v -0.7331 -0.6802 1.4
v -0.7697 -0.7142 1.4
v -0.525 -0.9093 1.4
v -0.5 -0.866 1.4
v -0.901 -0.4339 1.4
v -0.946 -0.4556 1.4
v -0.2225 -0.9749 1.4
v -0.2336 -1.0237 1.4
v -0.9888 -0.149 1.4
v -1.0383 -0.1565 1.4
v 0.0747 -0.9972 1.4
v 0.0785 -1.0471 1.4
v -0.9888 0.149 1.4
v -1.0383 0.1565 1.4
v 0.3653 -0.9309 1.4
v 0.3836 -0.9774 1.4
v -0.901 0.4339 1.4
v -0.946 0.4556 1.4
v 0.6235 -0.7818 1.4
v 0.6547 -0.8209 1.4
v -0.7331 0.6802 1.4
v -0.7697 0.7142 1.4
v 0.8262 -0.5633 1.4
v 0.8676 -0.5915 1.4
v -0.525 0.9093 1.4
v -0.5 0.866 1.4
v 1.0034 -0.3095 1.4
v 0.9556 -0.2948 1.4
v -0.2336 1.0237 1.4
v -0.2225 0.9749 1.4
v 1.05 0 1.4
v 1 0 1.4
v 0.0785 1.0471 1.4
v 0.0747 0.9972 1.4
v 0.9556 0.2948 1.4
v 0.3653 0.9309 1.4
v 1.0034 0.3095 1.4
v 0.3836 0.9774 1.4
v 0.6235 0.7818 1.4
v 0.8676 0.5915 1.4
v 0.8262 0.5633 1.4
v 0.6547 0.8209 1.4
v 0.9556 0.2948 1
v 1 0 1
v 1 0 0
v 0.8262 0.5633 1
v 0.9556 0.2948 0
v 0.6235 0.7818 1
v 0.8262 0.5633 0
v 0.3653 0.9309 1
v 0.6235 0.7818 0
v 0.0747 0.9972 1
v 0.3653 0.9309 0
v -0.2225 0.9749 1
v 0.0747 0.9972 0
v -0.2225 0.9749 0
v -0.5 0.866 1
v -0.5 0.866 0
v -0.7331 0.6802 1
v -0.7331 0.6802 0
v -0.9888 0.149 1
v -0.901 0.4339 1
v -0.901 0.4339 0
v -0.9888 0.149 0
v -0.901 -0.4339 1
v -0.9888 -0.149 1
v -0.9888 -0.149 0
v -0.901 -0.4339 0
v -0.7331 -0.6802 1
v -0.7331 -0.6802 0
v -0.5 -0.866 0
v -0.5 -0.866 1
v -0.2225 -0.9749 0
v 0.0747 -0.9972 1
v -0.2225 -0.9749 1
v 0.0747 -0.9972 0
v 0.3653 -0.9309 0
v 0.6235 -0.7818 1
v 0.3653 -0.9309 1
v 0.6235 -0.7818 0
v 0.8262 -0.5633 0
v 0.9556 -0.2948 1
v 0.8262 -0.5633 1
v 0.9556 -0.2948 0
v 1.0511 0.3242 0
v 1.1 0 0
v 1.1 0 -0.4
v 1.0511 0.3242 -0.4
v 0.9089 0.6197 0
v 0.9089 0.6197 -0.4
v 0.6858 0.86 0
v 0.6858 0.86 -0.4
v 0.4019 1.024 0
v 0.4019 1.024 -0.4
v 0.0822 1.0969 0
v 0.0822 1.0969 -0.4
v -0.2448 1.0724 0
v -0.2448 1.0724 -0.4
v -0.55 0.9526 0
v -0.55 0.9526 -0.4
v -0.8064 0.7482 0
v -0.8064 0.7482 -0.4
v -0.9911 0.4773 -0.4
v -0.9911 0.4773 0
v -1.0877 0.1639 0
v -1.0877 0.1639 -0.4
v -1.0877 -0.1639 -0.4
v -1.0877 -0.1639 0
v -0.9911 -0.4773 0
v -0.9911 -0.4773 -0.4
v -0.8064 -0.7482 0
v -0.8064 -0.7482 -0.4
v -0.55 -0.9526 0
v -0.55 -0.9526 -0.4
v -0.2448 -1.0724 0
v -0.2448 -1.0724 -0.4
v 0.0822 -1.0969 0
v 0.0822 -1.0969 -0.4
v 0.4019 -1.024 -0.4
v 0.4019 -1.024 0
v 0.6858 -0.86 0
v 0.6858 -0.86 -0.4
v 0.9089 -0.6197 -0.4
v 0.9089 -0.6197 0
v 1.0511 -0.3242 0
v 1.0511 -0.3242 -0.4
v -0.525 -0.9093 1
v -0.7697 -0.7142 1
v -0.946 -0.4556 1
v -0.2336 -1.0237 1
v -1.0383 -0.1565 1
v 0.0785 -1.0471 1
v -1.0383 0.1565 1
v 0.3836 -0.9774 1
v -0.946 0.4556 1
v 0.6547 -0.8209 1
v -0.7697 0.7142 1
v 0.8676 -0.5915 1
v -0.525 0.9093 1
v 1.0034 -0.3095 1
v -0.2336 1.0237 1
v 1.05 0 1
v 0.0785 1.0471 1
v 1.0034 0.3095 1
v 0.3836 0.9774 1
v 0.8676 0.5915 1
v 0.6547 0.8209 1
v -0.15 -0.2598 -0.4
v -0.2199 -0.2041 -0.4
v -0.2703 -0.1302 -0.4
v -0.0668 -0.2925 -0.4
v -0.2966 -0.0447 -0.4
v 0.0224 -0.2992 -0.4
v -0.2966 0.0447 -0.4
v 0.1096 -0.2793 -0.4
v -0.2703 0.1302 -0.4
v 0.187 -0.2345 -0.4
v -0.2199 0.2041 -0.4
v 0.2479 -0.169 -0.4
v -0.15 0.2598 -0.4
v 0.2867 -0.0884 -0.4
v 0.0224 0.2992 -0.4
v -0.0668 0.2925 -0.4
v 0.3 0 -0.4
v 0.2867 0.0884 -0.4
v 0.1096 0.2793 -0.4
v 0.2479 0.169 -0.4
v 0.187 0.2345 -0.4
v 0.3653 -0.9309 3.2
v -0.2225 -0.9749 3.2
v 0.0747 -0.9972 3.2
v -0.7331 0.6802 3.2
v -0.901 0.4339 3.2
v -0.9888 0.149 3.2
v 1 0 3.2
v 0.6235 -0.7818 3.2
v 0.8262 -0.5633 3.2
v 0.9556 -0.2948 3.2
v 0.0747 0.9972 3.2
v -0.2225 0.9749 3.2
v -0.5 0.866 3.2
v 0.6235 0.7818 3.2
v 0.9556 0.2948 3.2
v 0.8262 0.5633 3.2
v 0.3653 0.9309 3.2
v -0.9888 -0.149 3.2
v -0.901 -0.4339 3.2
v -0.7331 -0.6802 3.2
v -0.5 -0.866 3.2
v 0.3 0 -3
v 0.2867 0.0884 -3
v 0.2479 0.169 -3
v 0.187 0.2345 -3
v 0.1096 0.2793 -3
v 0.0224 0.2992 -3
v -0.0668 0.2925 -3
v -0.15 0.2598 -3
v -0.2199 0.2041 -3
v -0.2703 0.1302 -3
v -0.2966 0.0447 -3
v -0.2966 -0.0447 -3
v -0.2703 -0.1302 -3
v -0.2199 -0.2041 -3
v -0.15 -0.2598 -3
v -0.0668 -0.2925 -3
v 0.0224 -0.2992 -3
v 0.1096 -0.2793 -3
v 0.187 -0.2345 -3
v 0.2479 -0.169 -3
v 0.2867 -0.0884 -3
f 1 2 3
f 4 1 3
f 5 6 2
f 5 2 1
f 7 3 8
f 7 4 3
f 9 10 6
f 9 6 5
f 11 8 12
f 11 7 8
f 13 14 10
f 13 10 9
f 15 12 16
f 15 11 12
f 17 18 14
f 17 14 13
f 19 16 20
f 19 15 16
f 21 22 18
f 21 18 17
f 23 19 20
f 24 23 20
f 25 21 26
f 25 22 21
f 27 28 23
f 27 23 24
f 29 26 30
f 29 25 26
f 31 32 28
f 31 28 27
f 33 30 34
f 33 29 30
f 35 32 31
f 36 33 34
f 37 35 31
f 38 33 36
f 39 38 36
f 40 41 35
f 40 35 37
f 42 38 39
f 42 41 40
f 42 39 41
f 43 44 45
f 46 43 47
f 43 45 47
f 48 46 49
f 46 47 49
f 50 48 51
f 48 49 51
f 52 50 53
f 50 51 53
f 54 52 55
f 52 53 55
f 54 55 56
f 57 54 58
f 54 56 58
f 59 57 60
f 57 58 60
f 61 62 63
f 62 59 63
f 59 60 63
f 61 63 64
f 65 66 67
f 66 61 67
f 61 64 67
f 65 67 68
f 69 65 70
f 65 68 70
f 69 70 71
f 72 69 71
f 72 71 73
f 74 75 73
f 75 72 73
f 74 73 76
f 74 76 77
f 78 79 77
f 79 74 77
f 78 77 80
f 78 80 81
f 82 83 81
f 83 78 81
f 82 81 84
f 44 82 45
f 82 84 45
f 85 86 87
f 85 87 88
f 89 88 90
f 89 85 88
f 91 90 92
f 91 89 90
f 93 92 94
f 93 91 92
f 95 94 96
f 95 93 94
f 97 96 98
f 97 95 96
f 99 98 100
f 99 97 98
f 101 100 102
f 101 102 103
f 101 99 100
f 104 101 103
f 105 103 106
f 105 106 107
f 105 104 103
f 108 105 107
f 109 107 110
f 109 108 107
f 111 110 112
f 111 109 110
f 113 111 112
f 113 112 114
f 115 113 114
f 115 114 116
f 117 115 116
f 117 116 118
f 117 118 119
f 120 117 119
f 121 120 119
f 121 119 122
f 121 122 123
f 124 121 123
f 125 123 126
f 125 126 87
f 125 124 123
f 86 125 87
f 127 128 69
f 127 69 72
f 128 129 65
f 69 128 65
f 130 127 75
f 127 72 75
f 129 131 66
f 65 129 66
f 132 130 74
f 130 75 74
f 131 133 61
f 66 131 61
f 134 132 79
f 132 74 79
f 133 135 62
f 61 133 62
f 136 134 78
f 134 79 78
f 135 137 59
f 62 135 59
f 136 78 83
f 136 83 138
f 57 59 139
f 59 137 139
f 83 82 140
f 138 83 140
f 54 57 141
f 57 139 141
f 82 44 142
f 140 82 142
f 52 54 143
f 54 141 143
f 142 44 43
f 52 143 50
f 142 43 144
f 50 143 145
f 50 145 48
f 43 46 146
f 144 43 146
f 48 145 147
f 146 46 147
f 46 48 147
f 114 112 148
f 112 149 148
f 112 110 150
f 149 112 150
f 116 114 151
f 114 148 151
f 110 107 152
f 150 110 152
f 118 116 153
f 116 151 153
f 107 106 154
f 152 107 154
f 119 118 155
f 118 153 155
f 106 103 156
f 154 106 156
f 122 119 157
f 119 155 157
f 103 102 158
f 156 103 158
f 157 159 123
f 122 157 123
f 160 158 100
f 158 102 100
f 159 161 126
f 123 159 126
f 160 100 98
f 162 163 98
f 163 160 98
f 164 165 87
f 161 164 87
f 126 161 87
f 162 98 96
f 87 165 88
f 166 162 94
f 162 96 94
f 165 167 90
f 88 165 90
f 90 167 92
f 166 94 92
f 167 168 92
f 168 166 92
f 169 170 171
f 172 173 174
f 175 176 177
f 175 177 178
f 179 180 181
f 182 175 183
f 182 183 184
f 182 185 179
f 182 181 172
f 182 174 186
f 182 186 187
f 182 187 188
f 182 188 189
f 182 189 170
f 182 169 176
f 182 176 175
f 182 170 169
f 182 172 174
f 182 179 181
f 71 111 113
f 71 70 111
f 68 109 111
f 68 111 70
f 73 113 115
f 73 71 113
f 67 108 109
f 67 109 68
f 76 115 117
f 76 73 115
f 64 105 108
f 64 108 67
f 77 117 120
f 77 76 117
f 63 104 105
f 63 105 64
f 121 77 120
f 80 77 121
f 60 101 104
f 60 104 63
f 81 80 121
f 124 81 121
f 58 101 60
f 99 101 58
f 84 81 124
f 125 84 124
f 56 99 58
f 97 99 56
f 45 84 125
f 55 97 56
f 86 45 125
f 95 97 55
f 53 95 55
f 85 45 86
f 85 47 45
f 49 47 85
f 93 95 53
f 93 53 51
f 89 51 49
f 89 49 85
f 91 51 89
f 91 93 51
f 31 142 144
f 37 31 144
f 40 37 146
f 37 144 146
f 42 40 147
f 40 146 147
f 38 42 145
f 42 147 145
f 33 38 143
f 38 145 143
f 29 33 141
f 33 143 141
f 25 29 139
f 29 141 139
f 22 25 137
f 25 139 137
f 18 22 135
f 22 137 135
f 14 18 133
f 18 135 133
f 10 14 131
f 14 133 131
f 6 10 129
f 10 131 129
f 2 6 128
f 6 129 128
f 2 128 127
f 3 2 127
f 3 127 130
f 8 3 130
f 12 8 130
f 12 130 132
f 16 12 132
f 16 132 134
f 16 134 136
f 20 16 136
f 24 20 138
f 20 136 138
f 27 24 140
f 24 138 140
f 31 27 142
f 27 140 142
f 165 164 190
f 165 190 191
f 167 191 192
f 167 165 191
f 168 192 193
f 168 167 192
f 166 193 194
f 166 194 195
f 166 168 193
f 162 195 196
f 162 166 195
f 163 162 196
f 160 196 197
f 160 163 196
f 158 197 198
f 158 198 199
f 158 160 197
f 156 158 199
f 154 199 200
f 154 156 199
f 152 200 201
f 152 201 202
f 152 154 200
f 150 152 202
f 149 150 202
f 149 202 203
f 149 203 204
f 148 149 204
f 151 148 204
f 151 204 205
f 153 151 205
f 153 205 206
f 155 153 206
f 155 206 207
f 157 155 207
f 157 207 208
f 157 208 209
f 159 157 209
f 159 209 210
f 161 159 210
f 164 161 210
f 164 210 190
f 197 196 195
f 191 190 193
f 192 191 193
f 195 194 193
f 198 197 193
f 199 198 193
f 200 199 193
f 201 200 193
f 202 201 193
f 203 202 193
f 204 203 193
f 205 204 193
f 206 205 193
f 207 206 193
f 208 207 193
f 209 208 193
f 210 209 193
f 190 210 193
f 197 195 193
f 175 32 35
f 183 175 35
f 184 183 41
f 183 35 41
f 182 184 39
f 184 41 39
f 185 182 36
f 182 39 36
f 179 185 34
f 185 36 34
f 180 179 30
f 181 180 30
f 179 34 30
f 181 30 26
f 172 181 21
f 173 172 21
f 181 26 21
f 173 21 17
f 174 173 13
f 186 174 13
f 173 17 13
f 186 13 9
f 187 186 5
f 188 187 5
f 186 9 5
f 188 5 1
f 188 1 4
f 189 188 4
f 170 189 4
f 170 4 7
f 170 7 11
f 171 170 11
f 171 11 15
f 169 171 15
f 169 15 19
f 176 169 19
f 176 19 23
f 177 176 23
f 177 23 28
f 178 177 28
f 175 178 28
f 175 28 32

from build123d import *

# Parameters (mm, degrees)
SKETCH_1_R      = 1
SKETCH_1_R_2    = 0.3
EXTRUDE_1_DEPTH = 3.2
SKETCH_1_3_R    = 1.1
SKETCH_1_3_R_2  = 1
SKETCH_1_3_R_3  = 0.3
EXTRUDE_2_DEPTH = 0.4
SKETCH_1_5_R    = 0.3
EXTRUDE_3_DEPTH = 3
SKETCH_2_R      = 1.05
EXTRUDE_4_DEPTH = 0.4


with BuildPart() as part:
    # Sketch 1 → Extrude 1 (new body)
    with BuildSketch(Plane.XY):
        Circle(SKETCH_1_R)
        Circle(SKETCH_1_R_2, mode=Mode.SUBTRACT)
        Circle(SKETCH_1_R_2)
    extrude(amount=EXTRUDE_1_DEPTH)



with BuildPart() as body_2:
    # Sketch 1_3 → Extrude 2 (new body)
    with BuildSketch(Plane.XY):
        Circle(SKETCH_1_3_R)
        Circle(SKETCH_1_3_R_2, mode=Mode.SUBTRACT)
        Circle(SKETCH_1_3_R_2)
        Circle(SKETCH_1_3_R_3, mode=Mode.SUBTRACT)
    extrude(amount=-EXTRUDE_2_DEPTH)


with BuildPart() as part_1:
    add(part.part)

    add(body_2.part)  # Extrude 3 merges body 2
    # Sketch 1_5 → Extrude 3 (add)
    with BuildSketch(Plane.XY):
        Circle(SKETCH_1_5_R)
    extrude(amount=-EXTRUDE_3_DEPTH)

    # Sketch 2 → Extrude 4 (add)
    with BuildSketch(Plane.XY.offset(1)):
        Circle(SKETCH_2_R)
    extrude(amount=EXTRUDE_4_DEPTH)


solid = part_1.part
